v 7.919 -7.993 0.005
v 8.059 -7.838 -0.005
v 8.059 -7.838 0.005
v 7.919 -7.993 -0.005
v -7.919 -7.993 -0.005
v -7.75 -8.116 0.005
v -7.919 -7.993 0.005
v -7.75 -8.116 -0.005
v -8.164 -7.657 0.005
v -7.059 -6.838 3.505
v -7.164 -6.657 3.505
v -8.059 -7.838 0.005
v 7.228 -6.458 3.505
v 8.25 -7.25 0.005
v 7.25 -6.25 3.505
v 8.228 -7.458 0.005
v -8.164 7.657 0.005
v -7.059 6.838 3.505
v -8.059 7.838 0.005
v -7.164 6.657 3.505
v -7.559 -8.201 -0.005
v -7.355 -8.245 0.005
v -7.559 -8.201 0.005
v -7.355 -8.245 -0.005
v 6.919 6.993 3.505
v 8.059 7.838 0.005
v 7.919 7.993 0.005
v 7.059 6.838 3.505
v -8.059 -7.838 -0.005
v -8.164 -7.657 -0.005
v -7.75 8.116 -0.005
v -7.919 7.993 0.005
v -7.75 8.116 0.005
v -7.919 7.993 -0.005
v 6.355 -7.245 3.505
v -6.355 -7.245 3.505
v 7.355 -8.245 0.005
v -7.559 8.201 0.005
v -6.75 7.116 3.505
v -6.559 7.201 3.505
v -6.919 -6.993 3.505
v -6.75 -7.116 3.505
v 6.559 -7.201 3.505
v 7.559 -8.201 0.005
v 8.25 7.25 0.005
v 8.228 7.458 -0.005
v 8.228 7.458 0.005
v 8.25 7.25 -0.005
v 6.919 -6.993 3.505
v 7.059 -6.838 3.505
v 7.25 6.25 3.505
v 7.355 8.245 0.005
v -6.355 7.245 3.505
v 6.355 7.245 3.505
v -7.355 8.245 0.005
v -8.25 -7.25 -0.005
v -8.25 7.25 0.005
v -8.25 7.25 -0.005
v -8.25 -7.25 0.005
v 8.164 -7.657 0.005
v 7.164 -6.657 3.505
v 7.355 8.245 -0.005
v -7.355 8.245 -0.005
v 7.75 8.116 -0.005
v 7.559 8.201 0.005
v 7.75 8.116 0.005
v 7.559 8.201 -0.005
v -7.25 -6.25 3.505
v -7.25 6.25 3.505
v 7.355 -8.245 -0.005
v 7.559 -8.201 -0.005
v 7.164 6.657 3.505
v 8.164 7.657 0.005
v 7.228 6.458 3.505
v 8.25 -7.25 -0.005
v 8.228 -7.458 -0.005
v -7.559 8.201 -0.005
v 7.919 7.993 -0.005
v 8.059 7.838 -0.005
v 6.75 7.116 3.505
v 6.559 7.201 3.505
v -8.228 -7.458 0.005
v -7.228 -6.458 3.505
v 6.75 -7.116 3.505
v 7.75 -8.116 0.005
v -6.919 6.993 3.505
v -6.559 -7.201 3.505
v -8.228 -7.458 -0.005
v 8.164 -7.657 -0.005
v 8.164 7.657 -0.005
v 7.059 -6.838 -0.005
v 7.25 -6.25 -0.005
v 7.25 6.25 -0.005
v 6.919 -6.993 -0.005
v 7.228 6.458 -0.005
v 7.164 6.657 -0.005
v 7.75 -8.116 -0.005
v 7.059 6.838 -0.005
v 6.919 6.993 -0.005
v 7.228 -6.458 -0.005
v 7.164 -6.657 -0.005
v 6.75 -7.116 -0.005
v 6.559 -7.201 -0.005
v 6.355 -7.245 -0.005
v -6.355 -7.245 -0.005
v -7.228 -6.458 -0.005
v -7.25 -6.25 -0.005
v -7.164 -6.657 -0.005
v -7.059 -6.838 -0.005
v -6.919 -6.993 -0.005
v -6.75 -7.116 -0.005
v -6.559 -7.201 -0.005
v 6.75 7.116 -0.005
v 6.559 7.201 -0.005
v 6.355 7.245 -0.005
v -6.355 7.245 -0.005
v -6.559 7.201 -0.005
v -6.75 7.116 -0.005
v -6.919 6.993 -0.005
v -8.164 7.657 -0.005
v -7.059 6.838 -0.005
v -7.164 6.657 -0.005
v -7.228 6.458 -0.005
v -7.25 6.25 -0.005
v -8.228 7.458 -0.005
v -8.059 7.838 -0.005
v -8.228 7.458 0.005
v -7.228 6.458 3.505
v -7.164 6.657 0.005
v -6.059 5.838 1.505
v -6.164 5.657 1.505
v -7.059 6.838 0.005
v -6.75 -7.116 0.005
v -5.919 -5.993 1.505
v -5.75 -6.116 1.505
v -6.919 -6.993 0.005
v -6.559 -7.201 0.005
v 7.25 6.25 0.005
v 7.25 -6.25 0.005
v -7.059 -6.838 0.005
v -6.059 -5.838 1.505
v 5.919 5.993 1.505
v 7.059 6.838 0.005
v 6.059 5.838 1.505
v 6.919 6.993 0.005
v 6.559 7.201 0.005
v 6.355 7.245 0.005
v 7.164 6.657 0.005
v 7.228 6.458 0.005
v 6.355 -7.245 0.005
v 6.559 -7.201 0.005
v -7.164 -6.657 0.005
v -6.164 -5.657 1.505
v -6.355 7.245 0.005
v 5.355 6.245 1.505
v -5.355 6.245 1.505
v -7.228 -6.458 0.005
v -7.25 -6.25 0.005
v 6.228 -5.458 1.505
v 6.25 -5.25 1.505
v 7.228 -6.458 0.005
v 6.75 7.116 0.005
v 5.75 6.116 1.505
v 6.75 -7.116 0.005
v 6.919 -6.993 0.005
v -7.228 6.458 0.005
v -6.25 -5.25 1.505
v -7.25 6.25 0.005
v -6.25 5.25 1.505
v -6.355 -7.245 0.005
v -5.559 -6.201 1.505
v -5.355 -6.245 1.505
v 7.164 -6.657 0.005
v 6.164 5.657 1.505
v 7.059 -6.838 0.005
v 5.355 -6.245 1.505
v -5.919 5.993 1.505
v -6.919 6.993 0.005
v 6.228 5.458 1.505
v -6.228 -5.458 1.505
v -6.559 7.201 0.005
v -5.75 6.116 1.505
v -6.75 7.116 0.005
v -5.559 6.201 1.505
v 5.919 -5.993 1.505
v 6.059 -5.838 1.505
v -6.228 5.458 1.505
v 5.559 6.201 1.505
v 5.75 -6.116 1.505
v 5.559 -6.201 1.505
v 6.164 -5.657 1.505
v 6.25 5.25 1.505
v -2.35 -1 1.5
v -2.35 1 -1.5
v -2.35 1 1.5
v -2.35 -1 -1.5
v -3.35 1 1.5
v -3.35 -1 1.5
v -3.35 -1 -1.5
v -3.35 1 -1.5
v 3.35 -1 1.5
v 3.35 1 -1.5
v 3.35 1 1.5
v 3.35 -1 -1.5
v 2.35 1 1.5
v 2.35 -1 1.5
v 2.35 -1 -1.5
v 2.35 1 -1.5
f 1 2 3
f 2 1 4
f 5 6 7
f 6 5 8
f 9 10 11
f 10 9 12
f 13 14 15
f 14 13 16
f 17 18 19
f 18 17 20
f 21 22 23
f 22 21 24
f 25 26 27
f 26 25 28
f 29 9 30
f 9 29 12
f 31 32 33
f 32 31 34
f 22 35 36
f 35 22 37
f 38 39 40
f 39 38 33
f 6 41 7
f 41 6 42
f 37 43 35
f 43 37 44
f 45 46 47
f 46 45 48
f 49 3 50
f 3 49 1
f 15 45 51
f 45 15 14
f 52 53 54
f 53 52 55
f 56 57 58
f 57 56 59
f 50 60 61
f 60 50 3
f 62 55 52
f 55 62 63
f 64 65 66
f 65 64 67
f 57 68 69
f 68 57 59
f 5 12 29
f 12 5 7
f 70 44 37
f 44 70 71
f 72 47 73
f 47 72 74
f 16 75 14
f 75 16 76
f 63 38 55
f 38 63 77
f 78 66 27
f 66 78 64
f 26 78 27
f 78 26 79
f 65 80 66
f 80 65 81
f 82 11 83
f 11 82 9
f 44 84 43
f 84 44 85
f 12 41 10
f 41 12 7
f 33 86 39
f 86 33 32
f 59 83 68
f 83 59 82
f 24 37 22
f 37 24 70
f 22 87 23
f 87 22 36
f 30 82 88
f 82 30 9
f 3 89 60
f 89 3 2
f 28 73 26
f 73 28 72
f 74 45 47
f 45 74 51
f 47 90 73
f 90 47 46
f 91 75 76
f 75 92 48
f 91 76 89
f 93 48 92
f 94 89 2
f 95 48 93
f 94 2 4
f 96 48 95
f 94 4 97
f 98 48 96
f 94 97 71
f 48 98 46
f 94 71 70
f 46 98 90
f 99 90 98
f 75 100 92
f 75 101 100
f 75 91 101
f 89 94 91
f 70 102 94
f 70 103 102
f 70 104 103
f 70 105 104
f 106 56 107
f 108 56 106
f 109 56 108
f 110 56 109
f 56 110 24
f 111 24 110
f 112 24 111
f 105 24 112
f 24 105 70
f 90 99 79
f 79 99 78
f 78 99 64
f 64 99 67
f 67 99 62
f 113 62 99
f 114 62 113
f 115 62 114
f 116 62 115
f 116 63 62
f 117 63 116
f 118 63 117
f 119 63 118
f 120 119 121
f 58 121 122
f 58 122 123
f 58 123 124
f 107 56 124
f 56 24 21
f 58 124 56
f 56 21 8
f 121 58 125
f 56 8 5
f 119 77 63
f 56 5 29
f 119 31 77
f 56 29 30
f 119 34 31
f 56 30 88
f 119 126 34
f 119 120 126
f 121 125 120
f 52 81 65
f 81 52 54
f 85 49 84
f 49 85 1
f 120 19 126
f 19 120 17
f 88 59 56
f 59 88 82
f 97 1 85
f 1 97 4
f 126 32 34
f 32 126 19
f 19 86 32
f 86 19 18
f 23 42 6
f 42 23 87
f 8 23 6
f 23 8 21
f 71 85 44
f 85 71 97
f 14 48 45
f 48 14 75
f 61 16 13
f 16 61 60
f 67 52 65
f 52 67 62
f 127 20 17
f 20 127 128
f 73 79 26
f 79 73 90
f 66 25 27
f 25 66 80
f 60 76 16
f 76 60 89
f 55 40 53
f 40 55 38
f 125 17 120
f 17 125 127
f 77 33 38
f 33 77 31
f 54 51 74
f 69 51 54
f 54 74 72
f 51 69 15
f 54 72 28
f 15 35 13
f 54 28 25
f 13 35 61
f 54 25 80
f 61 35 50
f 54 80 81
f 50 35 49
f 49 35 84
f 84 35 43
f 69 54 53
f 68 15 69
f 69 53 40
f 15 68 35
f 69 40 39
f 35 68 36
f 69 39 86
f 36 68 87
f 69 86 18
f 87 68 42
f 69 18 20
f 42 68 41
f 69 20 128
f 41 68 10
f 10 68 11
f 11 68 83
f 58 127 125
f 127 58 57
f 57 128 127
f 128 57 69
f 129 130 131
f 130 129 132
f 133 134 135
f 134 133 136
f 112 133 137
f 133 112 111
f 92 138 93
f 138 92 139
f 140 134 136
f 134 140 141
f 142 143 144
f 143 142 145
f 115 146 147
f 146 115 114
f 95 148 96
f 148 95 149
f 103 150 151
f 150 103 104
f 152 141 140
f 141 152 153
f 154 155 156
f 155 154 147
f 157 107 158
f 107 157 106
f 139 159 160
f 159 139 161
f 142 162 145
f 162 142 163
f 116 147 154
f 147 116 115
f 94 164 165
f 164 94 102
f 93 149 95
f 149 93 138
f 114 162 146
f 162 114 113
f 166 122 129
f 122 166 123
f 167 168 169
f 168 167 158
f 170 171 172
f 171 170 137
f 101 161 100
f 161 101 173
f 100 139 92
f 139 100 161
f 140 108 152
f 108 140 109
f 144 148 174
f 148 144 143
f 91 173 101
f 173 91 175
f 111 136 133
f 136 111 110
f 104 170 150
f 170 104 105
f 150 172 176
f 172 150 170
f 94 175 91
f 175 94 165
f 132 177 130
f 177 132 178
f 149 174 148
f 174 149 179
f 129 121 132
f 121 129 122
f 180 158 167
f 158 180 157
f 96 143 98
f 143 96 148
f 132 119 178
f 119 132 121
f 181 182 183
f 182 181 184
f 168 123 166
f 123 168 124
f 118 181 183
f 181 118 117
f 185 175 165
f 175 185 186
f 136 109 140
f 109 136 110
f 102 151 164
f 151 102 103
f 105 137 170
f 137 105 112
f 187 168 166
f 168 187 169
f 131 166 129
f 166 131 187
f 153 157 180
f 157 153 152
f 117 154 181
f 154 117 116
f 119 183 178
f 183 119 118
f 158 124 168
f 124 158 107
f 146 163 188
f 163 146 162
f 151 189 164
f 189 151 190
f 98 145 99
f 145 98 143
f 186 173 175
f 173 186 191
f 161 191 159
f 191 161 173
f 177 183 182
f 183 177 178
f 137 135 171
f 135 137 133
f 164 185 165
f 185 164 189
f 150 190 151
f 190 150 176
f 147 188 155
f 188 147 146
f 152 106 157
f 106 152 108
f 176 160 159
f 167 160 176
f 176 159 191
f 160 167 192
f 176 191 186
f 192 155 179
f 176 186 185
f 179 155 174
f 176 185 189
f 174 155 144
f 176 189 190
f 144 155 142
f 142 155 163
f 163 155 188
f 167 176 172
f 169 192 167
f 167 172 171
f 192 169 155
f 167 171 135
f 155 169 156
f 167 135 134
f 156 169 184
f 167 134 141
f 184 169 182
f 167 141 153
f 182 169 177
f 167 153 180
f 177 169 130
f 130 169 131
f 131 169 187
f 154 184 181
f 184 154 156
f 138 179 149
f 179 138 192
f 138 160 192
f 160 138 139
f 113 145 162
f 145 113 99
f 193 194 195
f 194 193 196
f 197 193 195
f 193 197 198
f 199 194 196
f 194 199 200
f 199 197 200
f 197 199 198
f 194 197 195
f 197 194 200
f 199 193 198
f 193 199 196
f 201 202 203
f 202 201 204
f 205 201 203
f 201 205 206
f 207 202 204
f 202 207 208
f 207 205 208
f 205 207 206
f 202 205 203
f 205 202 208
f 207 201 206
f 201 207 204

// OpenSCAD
// https://qiita.com/zk_phi/items/ab99315ebaef66e84aa0
// https://bebebe.hatenablog.jp/entry/2019/06/04/232501


$fs = 0.1;

module rounded_cube (size, r) {
  h = 0.0001; // cylinder の高さ (適当な値)
  minkowski () {
    cube([size[0] - r*2, size[1] - r*2, size[2] - h], center = true);
    cylinder(r = r, h = h);
  }
}

module keycap_outer_shape (key_bottom_size, key_top_size, key_top_height) {
    hull () {
        translate([0, 0, key_top_height])
        rounded_cube([key_top_size, key_top_size, 0.01], 1);
        rounded_cube([key_bottom_size, key_bottom_size, 0.01], 1);
    }
}

module keycap_shape () {
  difference () {
    keycap_outer_shape(16.5, 14.5, 3.5);
    // 一回り小さいキーキャップ外形
    keycap_outer_shape(14.5, 12.5, 1.5);
  }
}

keycap_shape();

module kailh_choc_v1_stem() {

    // Latches for switch housing
    translate([-2.85, 0, 0])
    cube([1, 2, 3], center=true);
    translate([2.85, 0, 0])
    cube([1, 2, 3], center=true);
}

kailh_choc_v1_stem();
